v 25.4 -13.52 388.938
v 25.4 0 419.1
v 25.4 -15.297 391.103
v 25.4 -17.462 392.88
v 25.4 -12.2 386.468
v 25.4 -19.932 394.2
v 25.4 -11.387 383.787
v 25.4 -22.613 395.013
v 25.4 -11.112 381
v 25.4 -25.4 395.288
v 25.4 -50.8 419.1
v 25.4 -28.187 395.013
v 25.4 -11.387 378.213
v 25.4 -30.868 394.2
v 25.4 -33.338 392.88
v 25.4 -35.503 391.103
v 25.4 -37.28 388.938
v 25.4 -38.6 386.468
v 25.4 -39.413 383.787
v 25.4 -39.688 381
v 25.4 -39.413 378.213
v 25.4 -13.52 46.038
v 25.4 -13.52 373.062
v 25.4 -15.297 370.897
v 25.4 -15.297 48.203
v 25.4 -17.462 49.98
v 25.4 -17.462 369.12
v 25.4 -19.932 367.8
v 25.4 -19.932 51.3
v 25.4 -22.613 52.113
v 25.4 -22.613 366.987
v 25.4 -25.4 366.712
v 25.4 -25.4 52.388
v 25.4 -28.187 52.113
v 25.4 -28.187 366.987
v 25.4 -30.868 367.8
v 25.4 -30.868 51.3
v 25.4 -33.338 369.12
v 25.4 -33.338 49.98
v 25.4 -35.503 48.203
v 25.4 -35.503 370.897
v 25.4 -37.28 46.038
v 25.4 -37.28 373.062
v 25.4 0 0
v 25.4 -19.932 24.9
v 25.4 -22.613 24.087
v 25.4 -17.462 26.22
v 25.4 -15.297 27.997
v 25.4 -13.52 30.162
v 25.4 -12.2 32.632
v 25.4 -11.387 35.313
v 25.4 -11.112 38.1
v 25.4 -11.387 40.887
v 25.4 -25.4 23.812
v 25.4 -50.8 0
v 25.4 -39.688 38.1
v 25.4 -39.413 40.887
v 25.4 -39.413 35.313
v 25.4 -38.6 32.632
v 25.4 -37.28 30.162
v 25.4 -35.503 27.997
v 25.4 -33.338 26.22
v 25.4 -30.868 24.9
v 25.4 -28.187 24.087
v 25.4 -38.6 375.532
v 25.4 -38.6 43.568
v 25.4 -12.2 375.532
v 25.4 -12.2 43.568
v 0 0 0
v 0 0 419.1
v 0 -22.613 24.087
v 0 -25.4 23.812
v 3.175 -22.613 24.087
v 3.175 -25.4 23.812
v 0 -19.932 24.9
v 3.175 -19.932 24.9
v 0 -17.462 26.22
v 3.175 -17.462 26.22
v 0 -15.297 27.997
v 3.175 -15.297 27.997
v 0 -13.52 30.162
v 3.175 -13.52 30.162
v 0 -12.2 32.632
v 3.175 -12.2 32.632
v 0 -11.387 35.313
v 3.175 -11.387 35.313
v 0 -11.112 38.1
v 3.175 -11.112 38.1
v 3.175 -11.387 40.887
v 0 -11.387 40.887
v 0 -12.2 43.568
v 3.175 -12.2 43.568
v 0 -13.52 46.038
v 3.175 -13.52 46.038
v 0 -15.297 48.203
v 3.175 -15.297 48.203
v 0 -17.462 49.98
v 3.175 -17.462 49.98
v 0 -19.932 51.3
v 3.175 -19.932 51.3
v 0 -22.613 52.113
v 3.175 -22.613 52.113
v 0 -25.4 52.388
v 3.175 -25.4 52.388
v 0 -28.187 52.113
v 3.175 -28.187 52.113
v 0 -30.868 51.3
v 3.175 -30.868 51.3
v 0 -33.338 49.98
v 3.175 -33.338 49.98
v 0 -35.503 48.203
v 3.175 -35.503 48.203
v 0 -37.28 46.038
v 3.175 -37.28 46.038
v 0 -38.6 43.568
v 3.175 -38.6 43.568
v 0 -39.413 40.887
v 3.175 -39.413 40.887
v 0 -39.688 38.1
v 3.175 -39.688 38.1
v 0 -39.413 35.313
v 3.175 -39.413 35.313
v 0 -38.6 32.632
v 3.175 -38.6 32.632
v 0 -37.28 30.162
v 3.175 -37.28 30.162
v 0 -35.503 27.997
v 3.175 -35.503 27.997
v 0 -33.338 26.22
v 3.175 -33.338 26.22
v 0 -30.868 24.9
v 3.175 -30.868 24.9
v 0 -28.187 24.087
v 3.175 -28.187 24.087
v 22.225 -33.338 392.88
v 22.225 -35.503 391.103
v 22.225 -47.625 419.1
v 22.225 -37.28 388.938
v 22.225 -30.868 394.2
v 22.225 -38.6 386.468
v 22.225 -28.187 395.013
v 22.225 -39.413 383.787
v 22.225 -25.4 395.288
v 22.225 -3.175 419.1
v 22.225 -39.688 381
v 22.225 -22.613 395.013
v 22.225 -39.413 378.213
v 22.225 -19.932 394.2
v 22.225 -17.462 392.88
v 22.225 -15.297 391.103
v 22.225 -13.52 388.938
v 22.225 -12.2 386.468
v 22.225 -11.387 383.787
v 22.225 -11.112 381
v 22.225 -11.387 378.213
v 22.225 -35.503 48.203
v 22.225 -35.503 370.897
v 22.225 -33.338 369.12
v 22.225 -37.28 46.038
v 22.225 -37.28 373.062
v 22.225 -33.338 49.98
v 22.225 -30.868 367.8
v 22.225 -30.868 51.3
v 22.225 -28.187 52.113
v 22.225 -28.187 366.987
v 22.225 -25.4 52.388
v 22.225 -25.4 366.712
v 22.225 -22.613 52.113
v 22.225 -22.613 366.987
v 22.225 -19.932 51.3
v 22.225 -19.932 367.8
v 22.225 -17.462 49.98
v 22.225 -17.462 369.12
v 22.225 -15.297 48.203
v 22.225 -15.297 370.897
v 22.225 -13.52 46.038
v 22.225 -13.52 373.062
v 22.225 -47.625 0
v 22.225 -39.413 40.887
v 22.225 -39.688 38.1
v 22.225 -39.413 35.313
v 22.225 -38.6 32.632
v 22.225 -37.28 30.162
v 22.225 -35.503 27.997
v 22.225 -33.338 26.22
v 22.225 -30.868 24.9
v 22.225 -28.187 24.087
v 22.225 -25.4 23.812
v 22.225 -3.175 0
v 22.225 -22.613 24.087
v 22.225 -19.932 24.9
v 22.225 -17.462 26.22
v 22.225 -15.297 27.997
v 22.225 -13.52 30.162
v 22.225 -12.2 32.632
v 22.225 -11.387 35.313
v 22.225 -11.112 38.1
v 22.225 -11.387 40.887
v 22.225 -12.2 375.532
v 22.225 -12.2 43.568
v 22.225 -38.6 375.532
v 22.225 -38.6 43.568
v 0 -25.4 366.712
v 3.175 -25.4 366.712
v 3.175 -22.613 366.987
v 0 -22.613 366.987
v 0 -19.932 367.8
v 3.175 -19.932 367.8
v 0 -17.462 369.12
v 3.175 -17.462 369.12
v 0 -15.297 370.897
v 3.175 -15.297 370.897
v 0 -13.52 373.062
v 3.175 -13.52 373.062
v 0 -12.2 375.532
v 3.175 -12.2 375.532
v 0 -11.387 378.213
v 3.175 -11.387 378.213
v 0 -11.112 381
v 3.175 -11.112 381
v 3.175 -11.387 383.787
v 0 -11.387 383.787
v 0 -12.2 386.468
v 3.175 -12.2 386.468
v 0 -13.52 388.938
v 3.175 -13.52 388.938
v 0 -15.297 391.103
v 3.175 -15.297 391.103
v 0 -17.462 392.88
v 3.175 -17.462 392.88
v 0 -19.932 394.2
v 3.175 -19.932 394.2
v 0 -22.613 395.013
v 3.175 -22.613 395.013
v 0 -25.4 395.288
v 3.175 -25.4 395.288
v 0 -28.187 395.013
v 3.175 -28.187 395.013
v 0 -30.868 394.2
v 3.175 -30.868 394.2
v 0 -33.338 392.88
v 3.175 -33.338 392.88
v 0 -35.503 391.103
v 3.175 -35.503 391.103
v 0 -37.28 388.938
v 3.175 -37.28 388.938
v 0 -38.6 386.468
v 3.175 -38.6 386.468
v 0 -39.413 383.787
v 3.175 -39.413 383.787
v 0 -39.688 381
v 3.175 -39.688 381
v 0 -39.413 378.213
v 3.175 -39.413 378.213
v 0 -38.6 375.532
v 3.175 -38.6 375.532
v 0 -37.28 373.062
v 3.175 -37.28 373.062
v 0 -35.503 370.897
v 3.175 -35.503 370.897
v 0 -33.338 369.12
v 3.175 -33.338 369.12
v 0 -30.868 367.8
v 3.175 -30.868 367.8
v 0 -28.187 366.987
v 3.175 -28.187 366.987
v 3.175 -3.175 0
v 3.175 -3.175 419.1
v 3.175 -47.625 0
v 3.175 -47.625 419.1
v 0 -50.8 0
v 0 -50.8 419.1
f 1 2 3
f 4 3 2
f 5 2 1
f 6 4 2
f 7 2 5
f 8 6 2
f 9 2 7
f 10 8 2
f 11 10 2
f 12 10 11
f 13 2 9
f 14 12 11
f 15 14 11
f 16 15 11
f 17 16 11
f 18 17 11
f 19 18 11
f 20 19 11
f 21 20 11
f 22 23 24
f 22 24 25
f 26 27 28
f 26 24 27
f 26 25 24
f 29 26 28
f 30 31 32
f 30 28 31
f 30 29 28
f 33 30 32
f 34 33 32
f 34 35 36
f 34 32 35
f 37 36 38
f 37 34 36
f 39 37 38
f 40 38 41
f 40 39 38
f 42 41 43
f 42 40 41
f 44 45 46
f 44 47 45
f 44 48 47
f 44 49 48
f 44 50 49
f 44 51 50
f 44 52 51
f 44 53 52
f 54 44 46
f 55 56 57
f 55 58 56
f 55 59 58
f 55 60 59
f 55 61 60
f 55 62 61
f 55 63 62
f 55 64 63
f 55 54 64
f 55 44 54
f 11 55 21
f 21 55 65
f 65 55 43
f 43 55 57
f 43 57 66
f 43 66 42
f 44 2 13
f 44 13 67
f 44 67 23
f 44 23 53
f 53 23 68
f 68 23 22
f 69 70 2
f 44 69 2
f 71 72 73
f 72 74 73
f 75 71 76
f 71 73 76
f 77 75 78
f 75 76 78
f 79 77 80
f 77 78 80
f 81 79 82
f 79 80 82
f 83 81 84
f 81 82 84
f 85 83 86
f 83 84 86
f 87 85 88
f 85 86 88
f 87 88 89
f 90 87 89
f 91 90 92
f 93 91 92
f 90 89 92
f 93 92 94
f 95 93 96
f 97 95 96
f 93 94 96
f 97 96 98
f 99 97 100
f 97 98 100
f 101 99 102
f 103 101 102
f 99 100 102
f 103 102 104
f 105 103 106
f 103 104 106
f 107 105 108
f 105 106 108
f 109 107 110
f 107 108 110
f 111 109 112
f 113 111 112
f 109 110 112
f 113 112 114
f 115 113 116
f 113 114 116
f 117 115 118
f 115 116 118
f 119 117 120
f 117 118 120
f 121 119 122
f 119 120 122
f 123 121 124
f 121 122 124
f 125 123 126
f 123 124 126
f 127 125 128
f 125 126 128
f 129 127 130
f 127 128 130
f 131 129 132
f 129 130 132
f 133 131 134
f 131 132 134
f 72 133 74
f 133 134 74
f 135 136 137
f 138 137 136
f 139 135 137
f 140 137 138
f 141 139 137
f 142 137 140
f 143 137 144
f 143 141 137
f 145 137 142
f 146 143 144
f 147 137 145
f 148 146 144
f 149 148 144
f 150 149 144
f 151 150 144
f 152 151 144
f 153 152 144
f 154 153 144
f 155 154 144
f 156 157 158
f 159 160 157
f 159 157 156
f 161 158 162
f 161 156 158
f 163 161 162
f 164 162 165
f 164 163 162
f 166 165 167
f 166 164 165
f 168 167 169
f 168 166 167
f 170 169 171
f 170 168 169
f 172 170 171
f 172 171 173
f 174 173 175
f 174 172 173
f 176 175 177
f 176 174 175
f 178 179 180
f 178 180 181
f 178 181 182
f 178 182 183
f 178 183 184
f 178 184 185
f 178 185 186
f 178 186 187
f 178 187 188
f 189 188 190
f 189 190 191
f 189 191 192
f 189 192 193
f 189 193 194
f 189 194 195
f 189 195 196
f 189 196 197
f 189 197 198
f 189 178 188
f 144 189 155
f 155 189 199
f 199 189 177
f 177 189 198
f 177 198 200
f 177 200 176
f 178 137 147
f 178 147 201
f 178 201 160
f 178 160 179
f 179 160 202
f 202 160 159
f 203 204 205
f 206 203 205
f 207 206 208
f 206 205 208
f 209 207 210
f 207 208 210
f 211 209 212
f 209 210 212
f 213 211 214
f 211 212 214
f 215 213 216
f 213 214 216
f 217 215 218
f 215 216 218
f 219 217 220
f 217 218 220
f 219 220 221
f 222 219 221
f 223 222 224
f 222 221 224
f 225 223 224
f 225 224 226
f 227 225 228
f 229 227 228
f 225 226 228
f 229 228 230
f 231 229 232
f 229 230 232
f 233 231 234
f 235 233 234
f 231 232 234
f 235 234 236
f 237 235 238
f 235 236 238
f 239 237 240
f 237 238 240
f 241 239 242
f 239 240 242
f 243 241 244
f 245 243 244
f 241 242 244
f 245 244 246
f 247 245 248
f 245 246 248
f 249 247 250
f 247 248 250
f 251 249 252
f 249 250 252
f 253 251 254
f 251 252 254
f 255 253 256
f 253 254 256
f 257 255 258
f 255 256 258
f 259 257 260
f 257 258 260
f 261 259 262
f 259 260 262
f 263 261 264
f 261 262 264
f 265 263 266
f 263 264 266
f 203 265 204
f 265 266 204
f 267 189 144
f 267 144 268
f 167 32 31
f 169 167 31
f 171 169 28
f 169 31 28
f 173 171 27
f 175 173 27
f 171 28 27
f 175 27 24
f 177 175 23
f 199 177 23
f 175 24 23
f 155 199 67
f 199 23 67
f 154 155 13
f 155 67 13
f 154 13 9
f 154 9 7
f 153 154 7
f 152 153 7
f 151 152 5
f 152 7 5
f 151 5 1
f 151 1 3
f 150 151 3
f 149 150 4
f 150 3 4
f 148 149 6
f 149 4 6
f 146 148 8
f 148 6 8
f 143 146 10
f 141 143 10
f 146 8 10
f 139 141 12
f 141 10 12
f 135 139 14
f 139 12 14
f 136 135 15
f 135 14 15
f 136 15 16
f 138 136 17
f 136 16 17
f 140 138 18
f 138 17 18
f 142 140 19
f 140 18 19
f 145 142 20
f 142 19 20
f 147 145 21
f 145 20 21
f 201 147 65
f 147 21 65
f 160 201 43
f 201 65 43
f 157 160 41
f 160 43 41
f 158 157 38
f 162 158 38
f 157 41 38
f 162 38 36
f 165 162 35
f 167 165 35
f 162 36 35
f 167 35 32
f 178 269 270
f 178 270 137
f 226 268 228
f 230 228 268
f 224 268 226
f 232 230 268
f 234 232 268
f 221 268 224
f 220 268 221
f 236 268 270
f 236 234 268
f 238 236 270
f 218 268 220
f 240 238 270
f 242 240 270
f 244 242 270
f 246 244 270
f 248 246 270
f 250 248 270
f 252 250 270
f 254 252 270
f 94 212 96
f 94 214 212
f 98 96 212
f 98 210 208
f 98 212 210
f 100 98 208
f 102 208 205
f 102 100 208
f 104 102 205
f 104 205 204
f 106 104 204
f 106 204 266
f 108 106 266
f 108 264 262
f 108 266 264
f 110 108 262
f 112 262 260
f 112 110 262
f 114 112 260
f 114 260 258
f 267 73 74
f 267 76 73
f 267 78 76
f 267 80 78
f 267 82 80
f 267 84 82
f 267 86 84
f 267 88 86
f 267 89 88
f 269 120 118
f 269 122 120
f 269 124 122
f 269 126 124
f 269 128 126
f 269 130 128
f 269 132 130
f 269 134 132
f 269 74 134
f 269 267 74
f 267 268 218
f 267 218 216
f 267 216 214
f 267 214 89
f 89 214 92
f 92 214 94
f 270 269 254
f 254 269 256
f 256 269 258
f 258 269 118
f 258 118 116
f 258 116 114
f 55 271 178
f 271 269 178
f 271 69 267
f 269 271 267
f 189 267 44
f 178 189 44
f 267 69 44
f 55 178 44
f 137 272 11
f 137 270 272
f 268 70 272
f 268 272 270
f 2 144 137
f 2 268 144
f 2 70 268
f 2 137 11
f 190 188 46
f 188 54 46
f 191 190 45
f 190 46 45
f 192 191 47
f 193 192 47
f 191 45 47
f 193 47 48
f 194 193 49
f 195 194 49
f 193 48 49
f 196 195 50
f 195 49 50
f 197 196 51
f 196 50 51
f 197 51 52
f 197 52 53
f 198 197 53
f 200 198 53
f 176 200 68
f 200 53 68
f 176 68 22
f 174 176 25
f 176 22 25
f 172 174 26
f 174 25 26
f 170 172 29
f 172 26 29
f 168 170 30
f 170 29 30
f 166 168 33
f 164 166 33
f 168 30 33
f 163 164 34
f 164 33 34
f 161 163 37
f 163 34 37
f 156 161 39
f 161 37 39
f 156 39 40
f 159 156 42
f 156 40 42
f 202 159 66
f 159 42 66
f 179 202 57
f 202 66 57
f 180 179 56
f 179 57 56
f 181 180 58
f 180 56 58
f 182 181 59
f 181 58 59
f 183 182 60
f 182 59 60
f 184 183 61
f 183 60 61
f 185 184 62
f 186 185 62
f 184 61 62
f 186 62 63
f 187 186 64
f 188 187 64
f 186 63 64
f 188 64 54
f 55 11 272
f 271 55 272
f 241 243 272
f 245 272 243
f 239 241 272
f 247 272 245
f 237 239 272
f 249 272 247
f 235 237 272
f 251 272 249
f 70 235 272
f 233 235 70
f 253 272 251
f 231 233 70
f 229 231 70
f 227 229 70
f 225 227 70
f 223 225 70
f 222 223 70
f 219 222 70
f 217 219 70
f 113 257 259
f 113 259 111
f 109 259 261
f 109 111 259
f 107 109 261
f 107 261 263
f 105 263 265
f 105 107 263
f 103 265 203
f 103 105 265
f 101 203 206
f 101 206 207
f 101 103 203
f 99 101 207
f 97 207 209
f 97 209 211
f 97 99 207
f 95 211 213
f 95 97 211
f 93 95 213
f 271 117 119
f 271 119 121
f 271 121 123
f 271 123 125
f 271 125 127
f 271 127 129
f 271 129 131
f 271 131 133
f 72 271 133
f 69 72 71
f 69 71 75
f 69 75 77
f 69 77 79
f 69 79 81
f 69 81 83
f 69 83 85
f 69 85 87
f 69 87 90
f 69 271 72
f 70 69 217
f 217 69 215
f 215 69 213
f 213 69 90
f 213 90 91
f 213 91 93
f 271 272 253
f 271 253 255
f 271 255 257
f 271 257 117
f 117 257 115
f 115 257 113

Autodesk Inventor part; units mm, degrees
ref_plane "YZ Plane" through (0, 0, 0) normal (1, 0, 0) x (0, 1, 0)
ref_plane "XZ Plane" through (0, 0, 0) normal (0, 1, 0) x (-1, 0, 0)
ref_plane "XY Plane" through (0, 0, 0) normal (0, 0, 1) x (1, 0, 0)
sketch "Sketch1" plane through (0, 0, 0) normal (0, 0, 1) x (1, 0, 0)
  line L0 (0, 0) -> (25.4, 0)
  line L1 (25.4, 0) -> (25.4, -50.8)
  line L2 (25.4, -50.8) -> (0, -50.8)
  line L3 (0, -50.8) -> (0, 0)
  line L4 (22.225, -3.175) -> (3.175, -3.175)
  line L5 (3.175, -3.175) -> (3.175, -47.625)
  line L6 (3.175, -47.625) -> (22.225, -47.625)
  line L7 (22.225, -47.625) -> (22.225, -3.175)
  dimension "d0" = 25.4
  dimension "d1" = 50.8
  dimension "d2" = 3.175
extrude "Extrusion1" add sketch "Sketch1" along normal blind 419.1
sketch "Sketch2" plane through (25.4, -50.8, 0) normal (1, 0, 0) x (0, 0, -1)
  circle A0 centre (-381, 25.4) radius 14.2875
  circle A1 centre (-38.1, 25.4) radius 14.2875
  line L0 (0, 50.8) -> (0, 0) projected
  line L1 (0, 0) -> (-419.1, 0) projected
  line L2 (-419.1, 0) -> (-419.1, 50.8) projected
  dimension "d5" = 38.1
  dimension "d6" = 25.4
  dimension "d7" = 28.575
  dimension "d8" = 25.4
  dimension "d9" = 38.1
  dimension "d10" = 28.575
  dimension "d13" = 342.9
extrude "Extrusion2" cut sketch "Sketch2" against normal blind 376.623
properties part number "DRL 6 Long"
